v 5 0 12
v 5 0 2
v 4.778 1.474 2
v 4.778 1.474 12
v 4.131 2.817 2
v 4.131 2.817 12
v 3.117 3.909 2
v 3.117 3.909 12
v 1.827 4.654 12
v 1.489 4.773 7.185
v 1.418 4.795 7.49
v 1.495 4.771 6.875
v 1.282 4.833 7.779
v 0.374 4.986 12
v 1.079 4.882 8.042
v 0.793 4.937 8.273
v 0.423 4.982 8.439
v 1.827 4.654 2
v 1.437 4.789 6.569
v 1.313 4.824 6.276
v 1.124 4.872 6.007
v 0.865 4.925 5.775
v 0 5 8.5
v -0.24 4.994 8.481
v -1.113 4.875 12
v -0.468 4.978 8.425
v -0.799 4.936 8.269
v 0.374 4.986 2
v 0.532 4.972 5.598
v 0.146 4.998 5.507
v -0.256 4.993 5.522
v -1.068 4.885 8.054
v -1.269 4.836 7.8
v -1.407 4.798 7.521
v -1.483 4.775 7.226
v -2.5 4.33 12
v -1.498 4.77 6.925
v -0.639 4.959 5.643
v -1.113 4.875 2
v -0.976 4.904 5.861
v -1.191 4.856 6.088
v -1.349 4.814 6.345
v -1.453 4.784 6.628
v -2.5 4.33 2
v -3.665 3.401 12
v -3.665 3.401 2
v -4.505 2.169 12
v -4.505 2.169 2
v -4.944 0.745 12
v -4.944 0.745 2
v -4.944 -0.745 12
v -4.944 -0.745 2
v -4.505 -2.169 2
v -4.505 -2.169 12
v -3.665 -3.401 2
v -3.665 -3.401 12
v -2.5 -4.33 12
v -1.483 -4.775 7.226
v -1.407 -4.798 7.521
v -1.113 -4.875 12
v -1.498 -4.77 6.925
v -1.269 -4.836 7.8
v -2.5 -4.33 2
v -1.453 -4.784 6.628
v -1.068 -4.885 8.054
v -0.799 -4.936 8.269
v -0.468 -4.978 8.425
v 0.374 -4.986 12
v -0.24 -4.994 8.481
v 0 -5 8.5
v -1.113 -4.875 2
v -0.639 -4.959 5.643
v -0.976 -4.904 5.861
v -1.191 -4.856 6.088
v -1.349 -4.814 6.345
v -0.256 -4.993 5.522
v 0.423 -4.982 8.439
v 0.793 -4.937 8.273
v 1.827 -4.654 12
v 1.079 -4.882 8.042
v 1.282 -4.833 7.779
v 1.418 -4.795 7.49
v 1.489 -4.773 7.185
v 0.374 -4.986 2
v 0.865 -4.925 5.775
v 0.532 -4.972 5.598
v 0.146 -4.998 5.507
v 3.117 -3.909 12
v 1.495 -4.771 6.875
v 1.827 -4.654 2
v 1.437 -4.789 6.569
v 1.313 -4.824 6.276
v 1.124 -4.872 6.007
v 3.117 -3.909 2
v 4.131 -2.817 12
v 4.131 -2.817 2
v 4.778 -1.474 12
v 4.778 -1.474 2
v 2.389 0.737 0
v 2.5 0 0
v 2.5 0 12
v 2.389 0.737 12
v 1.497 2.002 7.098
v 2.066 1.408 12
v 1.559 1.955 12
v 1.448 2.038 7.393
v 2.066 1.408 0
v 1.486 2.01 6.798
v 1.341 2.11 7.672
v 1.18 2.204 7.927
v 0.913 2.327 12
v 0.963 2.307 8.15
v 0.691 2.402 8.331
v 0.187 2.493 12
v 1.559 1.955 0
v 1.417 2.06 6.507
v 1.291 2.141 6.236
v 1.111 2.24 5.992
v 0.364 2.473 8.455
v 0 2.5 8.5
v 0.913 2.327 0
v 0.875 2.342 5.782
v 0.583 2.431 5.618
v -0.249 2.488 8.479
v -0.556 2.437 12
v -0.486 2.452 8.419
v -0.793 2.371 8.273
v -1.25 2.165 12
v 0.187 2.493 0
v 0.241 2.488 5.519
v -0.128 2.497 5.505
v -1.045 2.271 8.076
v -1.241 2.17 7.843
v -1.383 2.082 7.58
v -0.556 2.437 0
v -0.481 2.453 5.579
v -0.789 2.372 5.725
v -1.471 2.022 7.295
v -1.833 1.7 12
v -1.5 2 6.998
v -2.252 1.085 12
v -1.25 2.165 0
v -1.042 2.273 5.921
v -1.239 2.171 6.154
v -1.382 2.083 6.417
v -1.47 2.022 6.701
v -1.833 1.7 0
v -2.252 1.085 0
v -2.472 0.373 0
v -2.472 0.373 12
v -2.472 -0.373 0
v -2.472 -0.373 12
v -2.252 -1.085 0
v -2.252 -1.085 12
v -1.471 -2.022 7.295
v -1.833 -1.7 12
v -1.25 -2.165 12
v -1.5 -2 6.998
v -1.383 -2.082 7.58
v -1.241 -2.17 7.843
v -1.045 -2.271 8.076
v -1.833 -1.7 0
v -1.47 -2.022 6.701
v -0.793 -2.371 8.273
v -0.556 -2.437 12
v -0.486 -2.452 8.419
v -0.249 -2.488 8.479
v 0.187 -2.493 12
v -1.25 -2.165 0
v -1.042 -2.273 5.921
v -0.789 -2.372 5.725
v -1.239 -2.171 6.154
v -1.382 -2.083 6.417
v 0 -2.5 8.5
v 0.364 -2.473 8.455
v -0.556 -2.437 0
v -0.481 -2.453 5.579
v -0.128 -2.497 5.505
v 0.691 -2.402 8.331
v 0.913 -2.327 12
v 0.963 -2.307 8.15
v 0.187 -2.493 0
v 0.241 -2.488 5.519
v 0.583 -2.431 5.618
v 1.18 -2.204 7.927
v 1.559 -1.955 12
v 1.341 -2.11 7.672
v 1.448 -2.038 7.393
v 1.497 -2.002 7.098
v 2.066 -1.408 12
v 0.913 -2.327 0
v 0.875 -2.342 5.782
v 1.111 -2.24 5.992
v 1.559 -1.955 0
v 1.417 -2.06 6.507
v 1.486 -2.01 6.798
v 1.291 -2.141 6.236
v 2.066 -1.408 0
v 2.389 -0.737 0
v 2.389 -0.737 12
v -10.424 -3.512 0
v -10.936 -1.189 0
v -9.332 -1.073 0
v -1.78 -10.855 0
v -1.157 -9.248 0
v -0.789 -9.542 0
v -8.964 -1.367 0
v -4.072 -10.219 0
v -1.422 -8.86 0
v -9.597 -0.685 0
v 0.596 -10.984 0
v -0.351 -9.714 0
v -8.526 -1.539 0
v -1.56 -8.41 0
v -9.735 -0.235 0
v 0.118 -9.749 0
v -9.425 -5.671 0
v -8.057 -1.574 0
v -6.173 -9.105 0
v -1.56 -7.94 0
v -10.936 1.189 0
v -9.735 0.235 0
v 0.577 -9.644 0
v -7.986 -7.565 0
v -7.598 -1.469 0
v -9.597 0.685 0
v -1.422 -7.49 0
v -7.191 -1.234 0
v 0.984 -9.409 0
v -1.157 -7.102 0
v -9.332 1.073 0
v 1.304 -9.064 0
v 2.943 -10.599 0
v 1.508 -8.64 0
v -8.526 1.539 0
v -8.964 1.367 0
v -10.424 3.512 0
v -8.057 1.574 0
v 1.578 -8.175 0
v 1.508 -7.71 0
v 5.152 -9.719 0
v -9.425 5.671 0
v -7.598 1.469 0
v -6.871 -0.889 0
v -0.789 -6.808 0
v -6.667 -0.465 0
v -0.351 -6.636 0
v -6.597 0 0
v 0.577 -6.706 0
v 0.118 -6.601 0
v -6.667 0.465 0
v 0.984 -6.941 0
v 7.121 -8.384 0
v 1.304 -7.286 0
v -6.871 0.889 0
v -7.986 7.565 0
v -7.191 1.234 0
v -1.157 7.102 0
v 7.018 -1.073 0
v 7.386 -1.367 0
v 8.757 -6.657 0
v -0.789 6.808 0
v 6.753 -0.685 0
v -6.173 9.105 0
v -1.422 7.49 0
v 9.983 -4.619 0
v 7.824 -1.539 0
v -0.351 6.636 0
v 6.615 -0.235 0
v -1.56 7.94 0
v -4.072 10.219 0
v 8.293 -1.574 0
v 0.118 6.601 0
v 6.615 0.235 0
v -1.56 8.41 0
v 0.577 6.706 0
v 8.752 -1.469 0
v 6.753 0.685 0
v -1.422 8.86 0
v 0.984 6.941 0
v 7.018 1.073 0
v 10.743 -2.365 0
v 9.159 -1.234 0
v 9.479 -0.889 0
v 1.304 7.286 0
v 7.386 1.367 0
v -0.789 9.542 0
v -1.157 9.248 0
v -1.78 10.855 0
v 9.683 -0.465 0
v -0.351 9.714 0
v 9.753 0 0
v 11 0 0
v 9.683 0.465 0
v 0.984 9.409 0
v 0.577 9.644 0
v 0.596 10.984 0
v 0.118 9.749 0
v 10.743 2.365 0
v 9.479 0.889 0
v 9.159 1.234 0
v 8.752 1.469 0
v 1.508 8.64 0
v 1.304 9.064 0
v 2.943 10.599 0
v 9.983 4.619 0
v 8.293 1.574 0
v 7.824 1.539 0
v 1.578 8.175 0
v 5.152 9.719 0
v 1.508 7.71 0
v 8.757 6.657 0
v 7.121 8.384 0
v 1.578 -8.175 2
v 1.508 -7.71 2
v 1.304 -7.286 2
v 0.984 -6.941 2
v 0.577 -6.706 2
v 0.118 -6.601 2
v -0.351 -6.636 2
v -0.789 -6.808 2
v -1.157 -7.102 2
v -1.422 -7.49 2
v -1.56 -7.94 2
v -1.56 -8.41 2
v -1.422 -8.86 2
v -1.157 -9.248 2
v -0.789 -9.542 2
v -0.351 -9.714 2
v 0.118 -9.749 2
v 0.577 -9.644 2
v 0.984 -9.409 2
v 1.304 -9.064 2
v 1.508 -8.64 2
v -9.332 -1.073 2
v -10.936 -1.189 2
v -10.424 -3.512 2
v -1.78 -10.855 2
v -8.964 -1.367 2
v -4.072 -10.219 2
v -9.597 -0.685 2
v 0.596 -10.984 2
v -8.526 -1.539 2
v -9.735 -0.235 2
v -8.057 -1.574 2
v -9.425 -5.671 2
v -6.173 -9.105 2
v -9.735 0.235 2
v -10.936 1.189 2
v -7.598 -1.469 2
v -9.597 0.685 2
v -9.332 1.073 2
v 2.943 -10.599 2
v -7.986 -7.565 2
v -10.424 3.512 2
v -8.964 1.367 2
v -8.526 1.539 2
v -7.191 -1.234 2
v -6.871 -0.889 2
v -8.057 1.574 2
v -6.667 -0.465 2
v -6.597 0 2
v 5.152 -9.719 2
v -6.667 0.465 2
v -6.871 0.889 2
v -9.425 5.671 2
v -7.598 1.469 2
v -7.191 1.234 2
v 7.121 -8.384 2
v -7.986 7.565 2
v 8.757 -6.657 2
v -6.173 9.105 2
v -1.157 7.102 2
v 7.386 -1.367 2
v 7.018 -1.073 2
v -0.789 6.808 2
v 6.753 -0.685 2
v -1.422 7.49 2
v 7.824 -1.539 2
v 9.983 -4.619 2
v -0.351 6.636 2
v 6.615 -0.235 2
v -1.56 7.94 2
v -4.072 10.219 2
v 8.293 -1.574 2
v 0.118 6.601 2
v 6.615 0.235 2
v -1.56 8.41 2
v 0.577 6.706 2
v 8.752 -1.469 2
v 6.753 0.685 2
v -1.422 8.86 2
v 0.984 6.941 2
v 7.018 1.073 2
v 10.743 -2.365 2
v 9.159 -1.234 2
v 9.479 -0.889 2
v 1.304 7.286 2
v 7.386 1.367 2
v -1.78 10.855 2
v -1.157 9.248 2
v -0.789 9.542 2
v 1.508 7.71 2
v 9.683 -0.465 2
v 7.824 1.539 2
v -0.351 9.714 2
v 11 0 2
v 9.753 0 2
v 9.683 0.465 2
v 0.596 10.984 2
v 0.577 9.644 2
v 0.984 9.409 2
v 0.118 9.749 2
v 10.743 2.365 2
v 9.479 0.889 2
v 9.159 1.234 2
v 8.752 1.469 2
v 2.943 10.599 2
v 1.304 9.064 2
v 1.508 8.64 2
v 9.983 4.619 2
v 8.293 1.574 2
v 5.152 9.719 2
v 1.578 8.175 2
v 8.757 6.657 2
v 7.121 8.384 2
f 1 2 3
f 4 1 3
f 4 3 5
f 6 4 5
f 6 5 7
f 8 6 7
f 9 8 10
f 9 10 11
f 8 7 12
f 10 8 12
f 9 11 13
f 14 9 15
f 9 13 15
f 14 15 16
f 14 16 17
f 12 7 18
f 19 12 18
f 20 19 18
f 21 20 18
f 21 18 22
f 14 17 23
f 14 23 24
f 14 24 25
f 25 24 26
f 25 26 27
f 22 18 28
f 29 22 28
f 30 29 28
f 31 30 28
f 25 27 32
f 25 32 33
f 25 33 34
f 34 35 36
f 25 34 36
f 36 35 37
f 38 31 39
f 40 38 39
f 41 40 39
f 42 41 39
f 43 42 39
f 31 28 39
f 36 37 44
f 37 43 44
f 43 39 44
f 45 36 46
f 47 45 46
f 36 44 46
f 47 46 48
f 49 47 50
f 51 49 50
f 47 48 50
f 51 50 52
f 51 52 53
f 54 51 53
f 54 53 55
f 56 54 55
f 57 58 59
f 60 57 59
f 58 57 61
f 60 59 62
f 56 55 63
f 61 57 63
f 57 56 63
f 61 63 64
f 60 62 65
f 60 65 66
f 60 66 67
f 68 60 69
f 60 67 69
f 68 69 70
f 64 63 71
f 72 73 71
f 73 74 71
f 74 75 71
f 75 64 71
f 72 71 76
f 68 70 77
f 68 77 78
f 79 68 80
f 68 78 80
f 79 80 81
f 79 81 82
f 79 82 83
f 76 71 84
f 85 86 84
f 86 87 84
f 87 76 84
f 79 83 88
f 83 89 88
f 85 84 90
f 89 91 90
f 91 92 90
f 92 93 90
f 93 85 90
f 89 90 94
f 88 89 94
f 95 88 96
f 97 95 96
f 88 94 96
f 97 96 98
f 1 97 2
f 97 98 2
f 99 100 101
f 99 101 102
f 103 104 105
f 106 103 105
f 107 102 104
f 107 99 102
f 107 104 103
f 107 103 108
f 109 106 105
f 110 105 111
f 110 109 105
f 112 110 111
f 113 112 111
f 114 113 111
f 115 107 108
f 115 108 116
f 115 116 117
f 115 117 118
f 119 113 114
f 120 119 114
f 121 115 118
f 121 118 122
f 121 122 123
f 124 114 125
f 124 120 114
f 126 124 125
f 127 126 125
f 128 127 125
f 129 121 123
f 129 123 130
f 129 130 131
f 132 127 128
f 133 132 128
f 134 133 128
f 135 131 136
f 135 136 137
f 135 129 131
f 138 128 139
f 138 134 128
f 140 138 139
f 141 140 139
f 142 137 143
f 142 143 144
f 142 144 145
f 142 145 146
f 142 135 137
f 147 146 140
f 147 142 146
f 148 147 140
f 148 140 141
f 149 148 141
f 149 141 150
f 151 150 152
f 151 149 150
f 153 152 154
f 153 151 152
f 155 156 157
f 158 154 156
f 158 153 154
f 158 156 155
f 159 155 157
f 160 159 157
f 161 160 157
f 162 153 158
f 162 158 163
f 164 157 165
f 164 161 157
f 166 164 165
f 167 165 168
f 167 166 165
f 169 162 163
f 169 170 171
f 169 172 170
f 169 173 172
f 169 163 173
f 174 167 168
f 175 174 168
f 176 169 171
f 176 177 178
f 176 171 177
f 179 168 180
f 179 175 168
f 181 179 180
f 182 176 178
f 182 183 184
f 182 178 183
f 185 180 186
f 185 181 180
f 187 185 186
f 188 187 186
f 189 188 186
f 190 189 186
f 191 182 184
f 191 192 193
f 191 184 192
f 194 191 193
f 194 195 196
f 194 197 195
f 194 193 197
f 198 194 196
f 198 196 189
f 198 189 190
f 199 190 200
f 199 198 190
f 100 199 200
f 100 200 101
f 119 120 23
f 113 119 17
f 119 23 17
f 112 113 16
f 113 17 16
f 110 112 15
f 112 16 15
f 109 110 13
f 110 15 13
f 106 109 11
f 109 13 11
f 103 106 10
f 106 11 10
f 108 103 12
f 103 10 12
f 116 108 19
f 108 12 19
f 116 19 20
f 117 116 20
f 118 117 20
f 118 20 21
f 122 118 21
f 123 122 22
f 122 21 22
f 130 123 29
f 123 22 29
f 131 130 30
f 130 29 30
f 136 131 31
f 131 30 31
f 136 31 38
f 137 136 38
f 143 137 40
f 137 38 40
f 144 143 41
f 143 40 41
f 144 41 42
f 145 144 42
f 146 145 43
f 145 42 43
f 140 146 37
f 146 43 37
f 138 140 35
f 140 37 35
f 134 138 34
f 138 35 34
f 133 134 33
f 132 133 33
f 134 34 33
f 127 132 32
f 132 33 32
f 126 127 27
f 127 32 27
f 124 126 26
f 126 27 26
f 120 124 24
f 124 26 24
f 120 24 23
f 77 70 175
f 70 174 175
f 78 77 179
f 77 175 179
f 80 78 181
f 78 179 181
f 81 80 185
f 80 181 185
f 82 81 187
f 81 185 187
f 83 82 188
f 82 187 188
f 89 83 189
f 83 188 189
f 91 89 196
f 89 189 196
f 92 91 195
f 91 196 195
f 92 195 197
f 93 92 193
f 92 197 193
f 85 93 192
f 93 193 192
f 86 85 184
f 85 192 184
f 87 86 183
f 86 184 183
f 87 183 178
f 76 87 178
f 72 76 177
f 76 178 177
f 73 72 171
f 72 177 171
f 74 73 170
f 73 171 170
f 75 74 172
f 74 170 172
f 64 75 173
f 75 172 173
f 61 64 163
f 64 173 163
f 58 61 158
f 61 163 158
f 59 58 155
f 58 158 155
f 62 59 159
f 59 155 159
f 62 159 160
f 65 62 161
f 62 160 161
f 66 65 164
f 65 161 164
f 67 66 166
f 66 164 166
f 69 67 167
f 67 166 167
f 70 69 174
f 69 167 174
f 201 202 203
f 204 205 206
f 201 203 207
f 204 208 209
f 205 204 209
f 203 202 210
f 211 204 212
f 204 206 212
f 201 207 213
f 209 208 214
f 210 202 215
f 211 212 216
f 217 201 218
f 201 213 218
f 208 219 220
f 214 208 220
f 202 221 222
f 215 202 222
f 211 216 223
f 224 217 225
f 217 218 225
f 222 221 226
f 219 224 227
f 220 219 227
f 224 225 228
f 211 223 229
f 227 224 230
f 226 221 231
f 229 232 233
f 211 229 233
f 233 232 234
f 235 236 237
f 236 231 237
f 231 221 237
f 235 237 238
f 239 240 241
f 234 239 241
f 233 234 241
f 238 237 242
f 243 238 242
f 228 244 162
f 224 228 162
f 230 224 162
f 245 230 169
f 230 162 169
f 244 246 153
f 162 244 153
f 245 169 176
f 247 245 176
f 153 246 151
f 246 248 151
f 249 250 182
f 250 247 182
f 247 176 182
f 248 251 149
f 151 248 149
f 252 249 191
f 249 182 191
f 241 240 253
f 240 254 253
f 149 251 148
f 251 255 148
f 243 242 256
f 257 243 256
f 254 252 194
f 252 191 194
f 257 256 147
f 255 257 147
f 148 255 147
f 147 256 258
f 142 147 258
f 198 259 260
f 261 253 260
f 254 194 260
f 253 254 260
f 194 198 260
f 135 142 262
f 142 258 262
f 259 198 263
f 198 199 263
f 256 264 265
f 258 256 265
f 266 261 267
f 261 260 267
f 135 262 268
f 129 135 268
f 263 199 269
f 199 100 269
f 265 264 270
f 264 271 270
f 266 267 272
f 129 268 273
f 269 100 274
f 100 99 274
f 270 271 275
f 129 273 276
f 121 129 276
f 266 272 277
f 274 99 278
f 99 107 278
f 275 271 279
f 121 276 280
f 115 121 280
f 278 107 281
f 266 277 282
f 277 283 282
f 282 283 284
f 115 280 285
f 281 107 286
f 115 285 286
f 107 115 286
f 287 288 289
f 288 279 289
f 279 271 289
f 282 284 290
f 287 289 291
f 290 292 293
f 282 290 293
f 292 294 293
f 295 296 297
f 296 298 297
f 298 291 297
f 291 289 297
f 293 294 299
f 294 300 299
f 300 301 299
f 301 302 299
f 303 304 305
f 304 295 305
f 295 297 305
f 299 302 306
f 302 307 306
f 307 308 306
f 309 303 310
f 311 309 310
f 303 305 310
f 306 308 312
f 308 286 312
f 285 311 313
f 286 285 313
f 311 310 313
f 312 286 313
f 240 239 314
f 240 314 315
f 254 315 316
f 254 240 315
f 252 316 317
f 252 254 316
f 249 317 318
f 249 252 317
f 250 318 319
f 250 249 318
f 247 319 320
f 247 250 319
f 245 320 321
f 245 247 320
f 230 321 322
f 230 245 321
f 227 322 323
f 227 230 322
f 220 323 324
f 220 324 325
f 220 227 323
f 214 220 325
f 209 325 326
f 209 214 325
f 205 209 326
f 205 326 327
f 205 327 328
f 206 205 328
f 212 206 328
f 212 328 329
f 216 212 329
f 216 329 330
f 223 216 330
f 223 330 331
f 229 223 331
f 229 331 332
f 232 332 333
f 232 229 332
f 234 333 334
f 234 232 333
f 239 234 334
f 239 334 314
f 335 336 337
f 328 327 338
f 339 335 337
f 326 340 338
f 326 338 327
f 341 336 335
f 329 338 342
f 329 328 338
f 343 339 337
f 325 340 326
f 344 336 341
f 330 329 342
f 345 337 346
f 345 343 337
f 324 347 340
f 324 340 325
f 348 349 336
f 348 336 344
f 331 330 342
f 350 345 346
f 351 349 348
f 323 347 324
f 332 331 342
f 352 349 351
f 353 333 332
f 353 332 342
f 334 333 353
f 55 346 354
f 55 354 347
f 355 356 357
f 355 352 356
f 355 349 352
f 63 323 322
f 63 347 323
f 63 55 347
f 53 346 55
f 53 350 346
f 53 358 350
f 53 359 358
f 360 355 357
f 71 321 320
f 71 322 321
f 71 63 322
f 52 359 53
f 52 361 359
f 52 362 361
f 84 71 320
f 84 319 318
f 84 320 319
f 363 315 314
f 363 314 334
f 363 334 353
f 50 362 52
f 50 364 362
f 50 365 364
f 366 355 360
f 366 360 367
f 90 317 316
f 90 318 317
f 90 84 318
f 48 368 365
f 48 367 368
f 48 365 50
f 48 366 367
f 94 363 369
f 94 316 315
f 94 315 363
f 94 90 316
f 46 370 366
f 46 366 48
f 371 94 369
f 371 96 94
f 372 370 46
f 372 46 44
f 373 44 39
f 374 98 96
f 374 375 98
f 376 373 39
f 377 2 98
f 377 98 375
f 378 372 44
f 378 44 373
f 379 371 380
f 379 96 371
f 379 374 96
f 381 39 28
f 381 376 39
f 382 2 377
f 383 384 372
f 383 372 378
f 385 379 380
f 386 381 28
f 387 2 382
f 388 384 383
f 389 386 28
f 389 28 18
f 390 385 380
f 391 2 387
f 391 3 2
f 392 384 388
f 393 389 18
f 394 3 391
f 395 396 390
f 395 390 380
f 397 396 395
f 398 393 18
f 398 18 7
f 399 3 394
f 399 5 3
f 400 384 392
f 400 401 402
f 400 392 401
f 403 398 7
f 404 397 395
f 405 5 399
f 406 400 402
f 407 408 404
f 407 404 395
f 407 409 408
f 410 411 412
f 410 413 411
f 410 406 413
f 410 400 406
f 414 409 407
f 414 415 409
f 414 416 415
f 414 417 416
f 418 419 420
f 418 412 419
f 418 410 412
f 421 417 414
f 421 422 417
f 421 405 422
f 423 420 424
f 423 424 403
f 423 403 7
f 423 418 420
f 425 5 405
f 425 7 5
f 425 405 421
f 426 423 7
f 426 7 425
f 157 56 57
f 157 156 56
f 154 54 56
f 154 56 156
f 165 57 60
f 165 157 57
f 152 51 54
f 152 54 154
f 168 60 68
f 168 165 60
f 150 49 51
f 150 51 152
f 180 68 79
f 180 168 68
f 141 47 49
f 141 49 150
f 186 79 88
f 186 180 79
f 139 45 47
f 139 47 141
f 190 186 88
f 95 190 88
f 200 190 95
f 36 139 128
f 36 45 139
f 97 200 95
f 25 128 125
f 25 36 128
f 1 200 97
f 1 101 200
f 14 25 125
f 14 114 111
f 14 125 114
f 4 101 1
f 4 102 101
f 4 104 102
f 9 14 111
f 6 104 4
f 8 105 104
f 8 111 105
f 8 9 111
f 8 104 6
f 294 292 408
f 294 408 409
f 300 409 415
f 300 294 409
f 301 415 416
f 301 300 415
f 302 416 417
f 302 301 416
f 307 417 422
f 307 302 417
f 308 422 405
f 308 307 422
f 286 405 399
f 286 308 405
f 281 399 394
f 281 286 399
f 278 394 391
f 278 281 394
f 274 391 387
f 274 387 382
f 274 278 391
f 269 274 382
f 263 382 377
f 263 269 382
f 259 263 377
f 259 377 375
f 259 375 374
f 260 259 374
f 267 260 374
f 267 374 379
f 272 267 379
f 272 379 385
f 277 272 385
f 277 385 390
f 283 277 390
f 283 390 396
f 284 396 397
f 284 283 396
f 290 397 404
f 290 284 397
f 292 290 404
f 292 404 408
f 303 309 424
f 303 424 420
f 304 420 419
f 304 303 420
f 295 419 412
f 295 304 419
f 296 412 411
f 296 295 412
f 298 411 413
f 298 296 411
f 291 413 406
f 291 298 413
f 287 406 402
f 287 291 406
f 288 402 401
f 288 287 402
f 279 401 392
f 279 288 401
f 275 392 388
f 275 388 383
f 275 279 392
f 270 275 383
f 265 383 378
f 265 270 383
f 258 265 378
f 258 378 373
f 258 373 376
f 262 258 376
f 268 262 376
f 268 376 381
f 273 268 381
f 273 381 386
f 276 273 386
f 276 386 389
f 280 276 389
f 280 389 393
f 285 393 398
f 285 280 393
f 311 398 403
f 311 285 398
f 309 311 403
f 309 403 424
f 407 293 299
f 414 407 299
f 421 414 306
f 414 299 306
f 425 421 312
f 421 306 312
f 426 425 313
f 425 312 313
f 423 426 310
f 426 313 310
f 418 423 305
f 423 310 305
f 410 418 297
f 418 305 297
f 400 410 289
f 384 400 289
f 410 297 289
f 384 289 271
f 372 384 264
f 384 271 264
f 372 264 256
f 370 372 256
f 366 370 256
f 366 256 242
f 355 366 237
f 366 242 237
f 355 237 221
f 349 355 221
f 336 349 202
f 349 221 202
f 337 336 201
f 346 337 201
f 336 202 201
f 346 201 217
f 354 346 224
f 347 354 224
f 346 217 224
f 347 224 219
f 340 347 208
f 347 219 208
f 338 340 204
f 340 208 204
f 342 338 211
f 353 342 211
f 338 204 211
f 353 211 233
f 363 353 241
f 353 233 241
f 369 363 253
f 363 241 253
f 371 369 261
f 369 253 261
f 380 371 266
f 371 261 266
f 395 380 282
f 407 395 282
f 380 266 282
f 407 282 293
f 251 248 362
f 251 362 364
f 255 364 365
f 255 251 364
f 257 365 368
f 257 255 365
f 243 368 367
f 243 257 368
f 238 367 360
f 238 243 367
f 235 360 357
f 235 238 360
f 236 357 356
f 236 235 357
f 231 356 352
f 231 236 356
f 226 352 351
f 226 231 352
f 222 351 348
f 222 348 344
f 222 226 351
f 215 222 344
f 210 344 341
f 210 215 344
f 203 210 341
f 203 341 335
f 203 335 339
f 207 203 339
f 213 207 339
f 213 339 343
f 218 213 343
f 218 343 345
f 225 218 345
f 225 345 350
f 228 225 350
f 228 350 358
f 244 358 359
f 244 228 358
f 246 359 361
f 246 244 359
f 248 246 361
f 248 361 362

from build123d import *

# Parameters (mm, degrees)
SKETCH1_R           = 11
SKETCH1_R_2         = 2.5
SKETCH1_R_3         = 1.578075371
BOSS_EXTRUDE1_DEPTH = 2
SKETCH2_R           = 5
SKETCH2_R_2         = 2.5
BOSS_EXTRUDE2_DEPTH = 10
SKETCH3_R           = 1.5
CUT_EXTRUDE1_DEPTH  = 10.5


with BuildPart() as part:
    # Sketch1 → Boss-Extrude1 (new body)
    with BuildSketch(Plane.XY):
        Circle(SKETCH1_R)
        Circle(SKETCH1_R_2, mode=Mode.SUBTRACT)
        with Locations((-8.175, 0)):
            Circle(SKETCH1_R_3, mode=Mode.SUBTRACT)
        with Locations((0, 8.175)):
            Circle(SKETCH1_R_3, mode=Mode.SUBTRACT)
        with Locations((8.175, 0)):
            Circle(SKETCH1_R_3, mode=Mode.SUBTRACT)
        with Locations((0, -8.175)):
            Circle(SKETCH1_R_3, mode=Mode.SUBTRACT)
    extrude(amount=BOSS_EXTRUDE1_DEPTH)

    # Sketch2 → Boss-Extrude2 (add)
    with BuildSketch(Plane.XY.offset(2)):
        Circle(SKETCH2_R)
        Circle(SKETCH2_R_2, mode=Mode.SUBTRACT)
    extrude(amount=BOSS_EXTRUDE2_DEPTH)

    # Sketch3 → Cut-Extrude1 (cut, symmetric)
    with BuildSketch(Plane(origin=(0, 0, 0), x_dir=(1, 0, 0), z_dir=(0, 1, 0))):
        with Locations(Location((0, -7, 0), (0, 0, 270))):
            Circle(SKETCH3_R)
    extrude(amount=CUT_EXTRUDE1_DEPTH, both=True, mode=Mode.SUBTRACT)


solid = part.part
